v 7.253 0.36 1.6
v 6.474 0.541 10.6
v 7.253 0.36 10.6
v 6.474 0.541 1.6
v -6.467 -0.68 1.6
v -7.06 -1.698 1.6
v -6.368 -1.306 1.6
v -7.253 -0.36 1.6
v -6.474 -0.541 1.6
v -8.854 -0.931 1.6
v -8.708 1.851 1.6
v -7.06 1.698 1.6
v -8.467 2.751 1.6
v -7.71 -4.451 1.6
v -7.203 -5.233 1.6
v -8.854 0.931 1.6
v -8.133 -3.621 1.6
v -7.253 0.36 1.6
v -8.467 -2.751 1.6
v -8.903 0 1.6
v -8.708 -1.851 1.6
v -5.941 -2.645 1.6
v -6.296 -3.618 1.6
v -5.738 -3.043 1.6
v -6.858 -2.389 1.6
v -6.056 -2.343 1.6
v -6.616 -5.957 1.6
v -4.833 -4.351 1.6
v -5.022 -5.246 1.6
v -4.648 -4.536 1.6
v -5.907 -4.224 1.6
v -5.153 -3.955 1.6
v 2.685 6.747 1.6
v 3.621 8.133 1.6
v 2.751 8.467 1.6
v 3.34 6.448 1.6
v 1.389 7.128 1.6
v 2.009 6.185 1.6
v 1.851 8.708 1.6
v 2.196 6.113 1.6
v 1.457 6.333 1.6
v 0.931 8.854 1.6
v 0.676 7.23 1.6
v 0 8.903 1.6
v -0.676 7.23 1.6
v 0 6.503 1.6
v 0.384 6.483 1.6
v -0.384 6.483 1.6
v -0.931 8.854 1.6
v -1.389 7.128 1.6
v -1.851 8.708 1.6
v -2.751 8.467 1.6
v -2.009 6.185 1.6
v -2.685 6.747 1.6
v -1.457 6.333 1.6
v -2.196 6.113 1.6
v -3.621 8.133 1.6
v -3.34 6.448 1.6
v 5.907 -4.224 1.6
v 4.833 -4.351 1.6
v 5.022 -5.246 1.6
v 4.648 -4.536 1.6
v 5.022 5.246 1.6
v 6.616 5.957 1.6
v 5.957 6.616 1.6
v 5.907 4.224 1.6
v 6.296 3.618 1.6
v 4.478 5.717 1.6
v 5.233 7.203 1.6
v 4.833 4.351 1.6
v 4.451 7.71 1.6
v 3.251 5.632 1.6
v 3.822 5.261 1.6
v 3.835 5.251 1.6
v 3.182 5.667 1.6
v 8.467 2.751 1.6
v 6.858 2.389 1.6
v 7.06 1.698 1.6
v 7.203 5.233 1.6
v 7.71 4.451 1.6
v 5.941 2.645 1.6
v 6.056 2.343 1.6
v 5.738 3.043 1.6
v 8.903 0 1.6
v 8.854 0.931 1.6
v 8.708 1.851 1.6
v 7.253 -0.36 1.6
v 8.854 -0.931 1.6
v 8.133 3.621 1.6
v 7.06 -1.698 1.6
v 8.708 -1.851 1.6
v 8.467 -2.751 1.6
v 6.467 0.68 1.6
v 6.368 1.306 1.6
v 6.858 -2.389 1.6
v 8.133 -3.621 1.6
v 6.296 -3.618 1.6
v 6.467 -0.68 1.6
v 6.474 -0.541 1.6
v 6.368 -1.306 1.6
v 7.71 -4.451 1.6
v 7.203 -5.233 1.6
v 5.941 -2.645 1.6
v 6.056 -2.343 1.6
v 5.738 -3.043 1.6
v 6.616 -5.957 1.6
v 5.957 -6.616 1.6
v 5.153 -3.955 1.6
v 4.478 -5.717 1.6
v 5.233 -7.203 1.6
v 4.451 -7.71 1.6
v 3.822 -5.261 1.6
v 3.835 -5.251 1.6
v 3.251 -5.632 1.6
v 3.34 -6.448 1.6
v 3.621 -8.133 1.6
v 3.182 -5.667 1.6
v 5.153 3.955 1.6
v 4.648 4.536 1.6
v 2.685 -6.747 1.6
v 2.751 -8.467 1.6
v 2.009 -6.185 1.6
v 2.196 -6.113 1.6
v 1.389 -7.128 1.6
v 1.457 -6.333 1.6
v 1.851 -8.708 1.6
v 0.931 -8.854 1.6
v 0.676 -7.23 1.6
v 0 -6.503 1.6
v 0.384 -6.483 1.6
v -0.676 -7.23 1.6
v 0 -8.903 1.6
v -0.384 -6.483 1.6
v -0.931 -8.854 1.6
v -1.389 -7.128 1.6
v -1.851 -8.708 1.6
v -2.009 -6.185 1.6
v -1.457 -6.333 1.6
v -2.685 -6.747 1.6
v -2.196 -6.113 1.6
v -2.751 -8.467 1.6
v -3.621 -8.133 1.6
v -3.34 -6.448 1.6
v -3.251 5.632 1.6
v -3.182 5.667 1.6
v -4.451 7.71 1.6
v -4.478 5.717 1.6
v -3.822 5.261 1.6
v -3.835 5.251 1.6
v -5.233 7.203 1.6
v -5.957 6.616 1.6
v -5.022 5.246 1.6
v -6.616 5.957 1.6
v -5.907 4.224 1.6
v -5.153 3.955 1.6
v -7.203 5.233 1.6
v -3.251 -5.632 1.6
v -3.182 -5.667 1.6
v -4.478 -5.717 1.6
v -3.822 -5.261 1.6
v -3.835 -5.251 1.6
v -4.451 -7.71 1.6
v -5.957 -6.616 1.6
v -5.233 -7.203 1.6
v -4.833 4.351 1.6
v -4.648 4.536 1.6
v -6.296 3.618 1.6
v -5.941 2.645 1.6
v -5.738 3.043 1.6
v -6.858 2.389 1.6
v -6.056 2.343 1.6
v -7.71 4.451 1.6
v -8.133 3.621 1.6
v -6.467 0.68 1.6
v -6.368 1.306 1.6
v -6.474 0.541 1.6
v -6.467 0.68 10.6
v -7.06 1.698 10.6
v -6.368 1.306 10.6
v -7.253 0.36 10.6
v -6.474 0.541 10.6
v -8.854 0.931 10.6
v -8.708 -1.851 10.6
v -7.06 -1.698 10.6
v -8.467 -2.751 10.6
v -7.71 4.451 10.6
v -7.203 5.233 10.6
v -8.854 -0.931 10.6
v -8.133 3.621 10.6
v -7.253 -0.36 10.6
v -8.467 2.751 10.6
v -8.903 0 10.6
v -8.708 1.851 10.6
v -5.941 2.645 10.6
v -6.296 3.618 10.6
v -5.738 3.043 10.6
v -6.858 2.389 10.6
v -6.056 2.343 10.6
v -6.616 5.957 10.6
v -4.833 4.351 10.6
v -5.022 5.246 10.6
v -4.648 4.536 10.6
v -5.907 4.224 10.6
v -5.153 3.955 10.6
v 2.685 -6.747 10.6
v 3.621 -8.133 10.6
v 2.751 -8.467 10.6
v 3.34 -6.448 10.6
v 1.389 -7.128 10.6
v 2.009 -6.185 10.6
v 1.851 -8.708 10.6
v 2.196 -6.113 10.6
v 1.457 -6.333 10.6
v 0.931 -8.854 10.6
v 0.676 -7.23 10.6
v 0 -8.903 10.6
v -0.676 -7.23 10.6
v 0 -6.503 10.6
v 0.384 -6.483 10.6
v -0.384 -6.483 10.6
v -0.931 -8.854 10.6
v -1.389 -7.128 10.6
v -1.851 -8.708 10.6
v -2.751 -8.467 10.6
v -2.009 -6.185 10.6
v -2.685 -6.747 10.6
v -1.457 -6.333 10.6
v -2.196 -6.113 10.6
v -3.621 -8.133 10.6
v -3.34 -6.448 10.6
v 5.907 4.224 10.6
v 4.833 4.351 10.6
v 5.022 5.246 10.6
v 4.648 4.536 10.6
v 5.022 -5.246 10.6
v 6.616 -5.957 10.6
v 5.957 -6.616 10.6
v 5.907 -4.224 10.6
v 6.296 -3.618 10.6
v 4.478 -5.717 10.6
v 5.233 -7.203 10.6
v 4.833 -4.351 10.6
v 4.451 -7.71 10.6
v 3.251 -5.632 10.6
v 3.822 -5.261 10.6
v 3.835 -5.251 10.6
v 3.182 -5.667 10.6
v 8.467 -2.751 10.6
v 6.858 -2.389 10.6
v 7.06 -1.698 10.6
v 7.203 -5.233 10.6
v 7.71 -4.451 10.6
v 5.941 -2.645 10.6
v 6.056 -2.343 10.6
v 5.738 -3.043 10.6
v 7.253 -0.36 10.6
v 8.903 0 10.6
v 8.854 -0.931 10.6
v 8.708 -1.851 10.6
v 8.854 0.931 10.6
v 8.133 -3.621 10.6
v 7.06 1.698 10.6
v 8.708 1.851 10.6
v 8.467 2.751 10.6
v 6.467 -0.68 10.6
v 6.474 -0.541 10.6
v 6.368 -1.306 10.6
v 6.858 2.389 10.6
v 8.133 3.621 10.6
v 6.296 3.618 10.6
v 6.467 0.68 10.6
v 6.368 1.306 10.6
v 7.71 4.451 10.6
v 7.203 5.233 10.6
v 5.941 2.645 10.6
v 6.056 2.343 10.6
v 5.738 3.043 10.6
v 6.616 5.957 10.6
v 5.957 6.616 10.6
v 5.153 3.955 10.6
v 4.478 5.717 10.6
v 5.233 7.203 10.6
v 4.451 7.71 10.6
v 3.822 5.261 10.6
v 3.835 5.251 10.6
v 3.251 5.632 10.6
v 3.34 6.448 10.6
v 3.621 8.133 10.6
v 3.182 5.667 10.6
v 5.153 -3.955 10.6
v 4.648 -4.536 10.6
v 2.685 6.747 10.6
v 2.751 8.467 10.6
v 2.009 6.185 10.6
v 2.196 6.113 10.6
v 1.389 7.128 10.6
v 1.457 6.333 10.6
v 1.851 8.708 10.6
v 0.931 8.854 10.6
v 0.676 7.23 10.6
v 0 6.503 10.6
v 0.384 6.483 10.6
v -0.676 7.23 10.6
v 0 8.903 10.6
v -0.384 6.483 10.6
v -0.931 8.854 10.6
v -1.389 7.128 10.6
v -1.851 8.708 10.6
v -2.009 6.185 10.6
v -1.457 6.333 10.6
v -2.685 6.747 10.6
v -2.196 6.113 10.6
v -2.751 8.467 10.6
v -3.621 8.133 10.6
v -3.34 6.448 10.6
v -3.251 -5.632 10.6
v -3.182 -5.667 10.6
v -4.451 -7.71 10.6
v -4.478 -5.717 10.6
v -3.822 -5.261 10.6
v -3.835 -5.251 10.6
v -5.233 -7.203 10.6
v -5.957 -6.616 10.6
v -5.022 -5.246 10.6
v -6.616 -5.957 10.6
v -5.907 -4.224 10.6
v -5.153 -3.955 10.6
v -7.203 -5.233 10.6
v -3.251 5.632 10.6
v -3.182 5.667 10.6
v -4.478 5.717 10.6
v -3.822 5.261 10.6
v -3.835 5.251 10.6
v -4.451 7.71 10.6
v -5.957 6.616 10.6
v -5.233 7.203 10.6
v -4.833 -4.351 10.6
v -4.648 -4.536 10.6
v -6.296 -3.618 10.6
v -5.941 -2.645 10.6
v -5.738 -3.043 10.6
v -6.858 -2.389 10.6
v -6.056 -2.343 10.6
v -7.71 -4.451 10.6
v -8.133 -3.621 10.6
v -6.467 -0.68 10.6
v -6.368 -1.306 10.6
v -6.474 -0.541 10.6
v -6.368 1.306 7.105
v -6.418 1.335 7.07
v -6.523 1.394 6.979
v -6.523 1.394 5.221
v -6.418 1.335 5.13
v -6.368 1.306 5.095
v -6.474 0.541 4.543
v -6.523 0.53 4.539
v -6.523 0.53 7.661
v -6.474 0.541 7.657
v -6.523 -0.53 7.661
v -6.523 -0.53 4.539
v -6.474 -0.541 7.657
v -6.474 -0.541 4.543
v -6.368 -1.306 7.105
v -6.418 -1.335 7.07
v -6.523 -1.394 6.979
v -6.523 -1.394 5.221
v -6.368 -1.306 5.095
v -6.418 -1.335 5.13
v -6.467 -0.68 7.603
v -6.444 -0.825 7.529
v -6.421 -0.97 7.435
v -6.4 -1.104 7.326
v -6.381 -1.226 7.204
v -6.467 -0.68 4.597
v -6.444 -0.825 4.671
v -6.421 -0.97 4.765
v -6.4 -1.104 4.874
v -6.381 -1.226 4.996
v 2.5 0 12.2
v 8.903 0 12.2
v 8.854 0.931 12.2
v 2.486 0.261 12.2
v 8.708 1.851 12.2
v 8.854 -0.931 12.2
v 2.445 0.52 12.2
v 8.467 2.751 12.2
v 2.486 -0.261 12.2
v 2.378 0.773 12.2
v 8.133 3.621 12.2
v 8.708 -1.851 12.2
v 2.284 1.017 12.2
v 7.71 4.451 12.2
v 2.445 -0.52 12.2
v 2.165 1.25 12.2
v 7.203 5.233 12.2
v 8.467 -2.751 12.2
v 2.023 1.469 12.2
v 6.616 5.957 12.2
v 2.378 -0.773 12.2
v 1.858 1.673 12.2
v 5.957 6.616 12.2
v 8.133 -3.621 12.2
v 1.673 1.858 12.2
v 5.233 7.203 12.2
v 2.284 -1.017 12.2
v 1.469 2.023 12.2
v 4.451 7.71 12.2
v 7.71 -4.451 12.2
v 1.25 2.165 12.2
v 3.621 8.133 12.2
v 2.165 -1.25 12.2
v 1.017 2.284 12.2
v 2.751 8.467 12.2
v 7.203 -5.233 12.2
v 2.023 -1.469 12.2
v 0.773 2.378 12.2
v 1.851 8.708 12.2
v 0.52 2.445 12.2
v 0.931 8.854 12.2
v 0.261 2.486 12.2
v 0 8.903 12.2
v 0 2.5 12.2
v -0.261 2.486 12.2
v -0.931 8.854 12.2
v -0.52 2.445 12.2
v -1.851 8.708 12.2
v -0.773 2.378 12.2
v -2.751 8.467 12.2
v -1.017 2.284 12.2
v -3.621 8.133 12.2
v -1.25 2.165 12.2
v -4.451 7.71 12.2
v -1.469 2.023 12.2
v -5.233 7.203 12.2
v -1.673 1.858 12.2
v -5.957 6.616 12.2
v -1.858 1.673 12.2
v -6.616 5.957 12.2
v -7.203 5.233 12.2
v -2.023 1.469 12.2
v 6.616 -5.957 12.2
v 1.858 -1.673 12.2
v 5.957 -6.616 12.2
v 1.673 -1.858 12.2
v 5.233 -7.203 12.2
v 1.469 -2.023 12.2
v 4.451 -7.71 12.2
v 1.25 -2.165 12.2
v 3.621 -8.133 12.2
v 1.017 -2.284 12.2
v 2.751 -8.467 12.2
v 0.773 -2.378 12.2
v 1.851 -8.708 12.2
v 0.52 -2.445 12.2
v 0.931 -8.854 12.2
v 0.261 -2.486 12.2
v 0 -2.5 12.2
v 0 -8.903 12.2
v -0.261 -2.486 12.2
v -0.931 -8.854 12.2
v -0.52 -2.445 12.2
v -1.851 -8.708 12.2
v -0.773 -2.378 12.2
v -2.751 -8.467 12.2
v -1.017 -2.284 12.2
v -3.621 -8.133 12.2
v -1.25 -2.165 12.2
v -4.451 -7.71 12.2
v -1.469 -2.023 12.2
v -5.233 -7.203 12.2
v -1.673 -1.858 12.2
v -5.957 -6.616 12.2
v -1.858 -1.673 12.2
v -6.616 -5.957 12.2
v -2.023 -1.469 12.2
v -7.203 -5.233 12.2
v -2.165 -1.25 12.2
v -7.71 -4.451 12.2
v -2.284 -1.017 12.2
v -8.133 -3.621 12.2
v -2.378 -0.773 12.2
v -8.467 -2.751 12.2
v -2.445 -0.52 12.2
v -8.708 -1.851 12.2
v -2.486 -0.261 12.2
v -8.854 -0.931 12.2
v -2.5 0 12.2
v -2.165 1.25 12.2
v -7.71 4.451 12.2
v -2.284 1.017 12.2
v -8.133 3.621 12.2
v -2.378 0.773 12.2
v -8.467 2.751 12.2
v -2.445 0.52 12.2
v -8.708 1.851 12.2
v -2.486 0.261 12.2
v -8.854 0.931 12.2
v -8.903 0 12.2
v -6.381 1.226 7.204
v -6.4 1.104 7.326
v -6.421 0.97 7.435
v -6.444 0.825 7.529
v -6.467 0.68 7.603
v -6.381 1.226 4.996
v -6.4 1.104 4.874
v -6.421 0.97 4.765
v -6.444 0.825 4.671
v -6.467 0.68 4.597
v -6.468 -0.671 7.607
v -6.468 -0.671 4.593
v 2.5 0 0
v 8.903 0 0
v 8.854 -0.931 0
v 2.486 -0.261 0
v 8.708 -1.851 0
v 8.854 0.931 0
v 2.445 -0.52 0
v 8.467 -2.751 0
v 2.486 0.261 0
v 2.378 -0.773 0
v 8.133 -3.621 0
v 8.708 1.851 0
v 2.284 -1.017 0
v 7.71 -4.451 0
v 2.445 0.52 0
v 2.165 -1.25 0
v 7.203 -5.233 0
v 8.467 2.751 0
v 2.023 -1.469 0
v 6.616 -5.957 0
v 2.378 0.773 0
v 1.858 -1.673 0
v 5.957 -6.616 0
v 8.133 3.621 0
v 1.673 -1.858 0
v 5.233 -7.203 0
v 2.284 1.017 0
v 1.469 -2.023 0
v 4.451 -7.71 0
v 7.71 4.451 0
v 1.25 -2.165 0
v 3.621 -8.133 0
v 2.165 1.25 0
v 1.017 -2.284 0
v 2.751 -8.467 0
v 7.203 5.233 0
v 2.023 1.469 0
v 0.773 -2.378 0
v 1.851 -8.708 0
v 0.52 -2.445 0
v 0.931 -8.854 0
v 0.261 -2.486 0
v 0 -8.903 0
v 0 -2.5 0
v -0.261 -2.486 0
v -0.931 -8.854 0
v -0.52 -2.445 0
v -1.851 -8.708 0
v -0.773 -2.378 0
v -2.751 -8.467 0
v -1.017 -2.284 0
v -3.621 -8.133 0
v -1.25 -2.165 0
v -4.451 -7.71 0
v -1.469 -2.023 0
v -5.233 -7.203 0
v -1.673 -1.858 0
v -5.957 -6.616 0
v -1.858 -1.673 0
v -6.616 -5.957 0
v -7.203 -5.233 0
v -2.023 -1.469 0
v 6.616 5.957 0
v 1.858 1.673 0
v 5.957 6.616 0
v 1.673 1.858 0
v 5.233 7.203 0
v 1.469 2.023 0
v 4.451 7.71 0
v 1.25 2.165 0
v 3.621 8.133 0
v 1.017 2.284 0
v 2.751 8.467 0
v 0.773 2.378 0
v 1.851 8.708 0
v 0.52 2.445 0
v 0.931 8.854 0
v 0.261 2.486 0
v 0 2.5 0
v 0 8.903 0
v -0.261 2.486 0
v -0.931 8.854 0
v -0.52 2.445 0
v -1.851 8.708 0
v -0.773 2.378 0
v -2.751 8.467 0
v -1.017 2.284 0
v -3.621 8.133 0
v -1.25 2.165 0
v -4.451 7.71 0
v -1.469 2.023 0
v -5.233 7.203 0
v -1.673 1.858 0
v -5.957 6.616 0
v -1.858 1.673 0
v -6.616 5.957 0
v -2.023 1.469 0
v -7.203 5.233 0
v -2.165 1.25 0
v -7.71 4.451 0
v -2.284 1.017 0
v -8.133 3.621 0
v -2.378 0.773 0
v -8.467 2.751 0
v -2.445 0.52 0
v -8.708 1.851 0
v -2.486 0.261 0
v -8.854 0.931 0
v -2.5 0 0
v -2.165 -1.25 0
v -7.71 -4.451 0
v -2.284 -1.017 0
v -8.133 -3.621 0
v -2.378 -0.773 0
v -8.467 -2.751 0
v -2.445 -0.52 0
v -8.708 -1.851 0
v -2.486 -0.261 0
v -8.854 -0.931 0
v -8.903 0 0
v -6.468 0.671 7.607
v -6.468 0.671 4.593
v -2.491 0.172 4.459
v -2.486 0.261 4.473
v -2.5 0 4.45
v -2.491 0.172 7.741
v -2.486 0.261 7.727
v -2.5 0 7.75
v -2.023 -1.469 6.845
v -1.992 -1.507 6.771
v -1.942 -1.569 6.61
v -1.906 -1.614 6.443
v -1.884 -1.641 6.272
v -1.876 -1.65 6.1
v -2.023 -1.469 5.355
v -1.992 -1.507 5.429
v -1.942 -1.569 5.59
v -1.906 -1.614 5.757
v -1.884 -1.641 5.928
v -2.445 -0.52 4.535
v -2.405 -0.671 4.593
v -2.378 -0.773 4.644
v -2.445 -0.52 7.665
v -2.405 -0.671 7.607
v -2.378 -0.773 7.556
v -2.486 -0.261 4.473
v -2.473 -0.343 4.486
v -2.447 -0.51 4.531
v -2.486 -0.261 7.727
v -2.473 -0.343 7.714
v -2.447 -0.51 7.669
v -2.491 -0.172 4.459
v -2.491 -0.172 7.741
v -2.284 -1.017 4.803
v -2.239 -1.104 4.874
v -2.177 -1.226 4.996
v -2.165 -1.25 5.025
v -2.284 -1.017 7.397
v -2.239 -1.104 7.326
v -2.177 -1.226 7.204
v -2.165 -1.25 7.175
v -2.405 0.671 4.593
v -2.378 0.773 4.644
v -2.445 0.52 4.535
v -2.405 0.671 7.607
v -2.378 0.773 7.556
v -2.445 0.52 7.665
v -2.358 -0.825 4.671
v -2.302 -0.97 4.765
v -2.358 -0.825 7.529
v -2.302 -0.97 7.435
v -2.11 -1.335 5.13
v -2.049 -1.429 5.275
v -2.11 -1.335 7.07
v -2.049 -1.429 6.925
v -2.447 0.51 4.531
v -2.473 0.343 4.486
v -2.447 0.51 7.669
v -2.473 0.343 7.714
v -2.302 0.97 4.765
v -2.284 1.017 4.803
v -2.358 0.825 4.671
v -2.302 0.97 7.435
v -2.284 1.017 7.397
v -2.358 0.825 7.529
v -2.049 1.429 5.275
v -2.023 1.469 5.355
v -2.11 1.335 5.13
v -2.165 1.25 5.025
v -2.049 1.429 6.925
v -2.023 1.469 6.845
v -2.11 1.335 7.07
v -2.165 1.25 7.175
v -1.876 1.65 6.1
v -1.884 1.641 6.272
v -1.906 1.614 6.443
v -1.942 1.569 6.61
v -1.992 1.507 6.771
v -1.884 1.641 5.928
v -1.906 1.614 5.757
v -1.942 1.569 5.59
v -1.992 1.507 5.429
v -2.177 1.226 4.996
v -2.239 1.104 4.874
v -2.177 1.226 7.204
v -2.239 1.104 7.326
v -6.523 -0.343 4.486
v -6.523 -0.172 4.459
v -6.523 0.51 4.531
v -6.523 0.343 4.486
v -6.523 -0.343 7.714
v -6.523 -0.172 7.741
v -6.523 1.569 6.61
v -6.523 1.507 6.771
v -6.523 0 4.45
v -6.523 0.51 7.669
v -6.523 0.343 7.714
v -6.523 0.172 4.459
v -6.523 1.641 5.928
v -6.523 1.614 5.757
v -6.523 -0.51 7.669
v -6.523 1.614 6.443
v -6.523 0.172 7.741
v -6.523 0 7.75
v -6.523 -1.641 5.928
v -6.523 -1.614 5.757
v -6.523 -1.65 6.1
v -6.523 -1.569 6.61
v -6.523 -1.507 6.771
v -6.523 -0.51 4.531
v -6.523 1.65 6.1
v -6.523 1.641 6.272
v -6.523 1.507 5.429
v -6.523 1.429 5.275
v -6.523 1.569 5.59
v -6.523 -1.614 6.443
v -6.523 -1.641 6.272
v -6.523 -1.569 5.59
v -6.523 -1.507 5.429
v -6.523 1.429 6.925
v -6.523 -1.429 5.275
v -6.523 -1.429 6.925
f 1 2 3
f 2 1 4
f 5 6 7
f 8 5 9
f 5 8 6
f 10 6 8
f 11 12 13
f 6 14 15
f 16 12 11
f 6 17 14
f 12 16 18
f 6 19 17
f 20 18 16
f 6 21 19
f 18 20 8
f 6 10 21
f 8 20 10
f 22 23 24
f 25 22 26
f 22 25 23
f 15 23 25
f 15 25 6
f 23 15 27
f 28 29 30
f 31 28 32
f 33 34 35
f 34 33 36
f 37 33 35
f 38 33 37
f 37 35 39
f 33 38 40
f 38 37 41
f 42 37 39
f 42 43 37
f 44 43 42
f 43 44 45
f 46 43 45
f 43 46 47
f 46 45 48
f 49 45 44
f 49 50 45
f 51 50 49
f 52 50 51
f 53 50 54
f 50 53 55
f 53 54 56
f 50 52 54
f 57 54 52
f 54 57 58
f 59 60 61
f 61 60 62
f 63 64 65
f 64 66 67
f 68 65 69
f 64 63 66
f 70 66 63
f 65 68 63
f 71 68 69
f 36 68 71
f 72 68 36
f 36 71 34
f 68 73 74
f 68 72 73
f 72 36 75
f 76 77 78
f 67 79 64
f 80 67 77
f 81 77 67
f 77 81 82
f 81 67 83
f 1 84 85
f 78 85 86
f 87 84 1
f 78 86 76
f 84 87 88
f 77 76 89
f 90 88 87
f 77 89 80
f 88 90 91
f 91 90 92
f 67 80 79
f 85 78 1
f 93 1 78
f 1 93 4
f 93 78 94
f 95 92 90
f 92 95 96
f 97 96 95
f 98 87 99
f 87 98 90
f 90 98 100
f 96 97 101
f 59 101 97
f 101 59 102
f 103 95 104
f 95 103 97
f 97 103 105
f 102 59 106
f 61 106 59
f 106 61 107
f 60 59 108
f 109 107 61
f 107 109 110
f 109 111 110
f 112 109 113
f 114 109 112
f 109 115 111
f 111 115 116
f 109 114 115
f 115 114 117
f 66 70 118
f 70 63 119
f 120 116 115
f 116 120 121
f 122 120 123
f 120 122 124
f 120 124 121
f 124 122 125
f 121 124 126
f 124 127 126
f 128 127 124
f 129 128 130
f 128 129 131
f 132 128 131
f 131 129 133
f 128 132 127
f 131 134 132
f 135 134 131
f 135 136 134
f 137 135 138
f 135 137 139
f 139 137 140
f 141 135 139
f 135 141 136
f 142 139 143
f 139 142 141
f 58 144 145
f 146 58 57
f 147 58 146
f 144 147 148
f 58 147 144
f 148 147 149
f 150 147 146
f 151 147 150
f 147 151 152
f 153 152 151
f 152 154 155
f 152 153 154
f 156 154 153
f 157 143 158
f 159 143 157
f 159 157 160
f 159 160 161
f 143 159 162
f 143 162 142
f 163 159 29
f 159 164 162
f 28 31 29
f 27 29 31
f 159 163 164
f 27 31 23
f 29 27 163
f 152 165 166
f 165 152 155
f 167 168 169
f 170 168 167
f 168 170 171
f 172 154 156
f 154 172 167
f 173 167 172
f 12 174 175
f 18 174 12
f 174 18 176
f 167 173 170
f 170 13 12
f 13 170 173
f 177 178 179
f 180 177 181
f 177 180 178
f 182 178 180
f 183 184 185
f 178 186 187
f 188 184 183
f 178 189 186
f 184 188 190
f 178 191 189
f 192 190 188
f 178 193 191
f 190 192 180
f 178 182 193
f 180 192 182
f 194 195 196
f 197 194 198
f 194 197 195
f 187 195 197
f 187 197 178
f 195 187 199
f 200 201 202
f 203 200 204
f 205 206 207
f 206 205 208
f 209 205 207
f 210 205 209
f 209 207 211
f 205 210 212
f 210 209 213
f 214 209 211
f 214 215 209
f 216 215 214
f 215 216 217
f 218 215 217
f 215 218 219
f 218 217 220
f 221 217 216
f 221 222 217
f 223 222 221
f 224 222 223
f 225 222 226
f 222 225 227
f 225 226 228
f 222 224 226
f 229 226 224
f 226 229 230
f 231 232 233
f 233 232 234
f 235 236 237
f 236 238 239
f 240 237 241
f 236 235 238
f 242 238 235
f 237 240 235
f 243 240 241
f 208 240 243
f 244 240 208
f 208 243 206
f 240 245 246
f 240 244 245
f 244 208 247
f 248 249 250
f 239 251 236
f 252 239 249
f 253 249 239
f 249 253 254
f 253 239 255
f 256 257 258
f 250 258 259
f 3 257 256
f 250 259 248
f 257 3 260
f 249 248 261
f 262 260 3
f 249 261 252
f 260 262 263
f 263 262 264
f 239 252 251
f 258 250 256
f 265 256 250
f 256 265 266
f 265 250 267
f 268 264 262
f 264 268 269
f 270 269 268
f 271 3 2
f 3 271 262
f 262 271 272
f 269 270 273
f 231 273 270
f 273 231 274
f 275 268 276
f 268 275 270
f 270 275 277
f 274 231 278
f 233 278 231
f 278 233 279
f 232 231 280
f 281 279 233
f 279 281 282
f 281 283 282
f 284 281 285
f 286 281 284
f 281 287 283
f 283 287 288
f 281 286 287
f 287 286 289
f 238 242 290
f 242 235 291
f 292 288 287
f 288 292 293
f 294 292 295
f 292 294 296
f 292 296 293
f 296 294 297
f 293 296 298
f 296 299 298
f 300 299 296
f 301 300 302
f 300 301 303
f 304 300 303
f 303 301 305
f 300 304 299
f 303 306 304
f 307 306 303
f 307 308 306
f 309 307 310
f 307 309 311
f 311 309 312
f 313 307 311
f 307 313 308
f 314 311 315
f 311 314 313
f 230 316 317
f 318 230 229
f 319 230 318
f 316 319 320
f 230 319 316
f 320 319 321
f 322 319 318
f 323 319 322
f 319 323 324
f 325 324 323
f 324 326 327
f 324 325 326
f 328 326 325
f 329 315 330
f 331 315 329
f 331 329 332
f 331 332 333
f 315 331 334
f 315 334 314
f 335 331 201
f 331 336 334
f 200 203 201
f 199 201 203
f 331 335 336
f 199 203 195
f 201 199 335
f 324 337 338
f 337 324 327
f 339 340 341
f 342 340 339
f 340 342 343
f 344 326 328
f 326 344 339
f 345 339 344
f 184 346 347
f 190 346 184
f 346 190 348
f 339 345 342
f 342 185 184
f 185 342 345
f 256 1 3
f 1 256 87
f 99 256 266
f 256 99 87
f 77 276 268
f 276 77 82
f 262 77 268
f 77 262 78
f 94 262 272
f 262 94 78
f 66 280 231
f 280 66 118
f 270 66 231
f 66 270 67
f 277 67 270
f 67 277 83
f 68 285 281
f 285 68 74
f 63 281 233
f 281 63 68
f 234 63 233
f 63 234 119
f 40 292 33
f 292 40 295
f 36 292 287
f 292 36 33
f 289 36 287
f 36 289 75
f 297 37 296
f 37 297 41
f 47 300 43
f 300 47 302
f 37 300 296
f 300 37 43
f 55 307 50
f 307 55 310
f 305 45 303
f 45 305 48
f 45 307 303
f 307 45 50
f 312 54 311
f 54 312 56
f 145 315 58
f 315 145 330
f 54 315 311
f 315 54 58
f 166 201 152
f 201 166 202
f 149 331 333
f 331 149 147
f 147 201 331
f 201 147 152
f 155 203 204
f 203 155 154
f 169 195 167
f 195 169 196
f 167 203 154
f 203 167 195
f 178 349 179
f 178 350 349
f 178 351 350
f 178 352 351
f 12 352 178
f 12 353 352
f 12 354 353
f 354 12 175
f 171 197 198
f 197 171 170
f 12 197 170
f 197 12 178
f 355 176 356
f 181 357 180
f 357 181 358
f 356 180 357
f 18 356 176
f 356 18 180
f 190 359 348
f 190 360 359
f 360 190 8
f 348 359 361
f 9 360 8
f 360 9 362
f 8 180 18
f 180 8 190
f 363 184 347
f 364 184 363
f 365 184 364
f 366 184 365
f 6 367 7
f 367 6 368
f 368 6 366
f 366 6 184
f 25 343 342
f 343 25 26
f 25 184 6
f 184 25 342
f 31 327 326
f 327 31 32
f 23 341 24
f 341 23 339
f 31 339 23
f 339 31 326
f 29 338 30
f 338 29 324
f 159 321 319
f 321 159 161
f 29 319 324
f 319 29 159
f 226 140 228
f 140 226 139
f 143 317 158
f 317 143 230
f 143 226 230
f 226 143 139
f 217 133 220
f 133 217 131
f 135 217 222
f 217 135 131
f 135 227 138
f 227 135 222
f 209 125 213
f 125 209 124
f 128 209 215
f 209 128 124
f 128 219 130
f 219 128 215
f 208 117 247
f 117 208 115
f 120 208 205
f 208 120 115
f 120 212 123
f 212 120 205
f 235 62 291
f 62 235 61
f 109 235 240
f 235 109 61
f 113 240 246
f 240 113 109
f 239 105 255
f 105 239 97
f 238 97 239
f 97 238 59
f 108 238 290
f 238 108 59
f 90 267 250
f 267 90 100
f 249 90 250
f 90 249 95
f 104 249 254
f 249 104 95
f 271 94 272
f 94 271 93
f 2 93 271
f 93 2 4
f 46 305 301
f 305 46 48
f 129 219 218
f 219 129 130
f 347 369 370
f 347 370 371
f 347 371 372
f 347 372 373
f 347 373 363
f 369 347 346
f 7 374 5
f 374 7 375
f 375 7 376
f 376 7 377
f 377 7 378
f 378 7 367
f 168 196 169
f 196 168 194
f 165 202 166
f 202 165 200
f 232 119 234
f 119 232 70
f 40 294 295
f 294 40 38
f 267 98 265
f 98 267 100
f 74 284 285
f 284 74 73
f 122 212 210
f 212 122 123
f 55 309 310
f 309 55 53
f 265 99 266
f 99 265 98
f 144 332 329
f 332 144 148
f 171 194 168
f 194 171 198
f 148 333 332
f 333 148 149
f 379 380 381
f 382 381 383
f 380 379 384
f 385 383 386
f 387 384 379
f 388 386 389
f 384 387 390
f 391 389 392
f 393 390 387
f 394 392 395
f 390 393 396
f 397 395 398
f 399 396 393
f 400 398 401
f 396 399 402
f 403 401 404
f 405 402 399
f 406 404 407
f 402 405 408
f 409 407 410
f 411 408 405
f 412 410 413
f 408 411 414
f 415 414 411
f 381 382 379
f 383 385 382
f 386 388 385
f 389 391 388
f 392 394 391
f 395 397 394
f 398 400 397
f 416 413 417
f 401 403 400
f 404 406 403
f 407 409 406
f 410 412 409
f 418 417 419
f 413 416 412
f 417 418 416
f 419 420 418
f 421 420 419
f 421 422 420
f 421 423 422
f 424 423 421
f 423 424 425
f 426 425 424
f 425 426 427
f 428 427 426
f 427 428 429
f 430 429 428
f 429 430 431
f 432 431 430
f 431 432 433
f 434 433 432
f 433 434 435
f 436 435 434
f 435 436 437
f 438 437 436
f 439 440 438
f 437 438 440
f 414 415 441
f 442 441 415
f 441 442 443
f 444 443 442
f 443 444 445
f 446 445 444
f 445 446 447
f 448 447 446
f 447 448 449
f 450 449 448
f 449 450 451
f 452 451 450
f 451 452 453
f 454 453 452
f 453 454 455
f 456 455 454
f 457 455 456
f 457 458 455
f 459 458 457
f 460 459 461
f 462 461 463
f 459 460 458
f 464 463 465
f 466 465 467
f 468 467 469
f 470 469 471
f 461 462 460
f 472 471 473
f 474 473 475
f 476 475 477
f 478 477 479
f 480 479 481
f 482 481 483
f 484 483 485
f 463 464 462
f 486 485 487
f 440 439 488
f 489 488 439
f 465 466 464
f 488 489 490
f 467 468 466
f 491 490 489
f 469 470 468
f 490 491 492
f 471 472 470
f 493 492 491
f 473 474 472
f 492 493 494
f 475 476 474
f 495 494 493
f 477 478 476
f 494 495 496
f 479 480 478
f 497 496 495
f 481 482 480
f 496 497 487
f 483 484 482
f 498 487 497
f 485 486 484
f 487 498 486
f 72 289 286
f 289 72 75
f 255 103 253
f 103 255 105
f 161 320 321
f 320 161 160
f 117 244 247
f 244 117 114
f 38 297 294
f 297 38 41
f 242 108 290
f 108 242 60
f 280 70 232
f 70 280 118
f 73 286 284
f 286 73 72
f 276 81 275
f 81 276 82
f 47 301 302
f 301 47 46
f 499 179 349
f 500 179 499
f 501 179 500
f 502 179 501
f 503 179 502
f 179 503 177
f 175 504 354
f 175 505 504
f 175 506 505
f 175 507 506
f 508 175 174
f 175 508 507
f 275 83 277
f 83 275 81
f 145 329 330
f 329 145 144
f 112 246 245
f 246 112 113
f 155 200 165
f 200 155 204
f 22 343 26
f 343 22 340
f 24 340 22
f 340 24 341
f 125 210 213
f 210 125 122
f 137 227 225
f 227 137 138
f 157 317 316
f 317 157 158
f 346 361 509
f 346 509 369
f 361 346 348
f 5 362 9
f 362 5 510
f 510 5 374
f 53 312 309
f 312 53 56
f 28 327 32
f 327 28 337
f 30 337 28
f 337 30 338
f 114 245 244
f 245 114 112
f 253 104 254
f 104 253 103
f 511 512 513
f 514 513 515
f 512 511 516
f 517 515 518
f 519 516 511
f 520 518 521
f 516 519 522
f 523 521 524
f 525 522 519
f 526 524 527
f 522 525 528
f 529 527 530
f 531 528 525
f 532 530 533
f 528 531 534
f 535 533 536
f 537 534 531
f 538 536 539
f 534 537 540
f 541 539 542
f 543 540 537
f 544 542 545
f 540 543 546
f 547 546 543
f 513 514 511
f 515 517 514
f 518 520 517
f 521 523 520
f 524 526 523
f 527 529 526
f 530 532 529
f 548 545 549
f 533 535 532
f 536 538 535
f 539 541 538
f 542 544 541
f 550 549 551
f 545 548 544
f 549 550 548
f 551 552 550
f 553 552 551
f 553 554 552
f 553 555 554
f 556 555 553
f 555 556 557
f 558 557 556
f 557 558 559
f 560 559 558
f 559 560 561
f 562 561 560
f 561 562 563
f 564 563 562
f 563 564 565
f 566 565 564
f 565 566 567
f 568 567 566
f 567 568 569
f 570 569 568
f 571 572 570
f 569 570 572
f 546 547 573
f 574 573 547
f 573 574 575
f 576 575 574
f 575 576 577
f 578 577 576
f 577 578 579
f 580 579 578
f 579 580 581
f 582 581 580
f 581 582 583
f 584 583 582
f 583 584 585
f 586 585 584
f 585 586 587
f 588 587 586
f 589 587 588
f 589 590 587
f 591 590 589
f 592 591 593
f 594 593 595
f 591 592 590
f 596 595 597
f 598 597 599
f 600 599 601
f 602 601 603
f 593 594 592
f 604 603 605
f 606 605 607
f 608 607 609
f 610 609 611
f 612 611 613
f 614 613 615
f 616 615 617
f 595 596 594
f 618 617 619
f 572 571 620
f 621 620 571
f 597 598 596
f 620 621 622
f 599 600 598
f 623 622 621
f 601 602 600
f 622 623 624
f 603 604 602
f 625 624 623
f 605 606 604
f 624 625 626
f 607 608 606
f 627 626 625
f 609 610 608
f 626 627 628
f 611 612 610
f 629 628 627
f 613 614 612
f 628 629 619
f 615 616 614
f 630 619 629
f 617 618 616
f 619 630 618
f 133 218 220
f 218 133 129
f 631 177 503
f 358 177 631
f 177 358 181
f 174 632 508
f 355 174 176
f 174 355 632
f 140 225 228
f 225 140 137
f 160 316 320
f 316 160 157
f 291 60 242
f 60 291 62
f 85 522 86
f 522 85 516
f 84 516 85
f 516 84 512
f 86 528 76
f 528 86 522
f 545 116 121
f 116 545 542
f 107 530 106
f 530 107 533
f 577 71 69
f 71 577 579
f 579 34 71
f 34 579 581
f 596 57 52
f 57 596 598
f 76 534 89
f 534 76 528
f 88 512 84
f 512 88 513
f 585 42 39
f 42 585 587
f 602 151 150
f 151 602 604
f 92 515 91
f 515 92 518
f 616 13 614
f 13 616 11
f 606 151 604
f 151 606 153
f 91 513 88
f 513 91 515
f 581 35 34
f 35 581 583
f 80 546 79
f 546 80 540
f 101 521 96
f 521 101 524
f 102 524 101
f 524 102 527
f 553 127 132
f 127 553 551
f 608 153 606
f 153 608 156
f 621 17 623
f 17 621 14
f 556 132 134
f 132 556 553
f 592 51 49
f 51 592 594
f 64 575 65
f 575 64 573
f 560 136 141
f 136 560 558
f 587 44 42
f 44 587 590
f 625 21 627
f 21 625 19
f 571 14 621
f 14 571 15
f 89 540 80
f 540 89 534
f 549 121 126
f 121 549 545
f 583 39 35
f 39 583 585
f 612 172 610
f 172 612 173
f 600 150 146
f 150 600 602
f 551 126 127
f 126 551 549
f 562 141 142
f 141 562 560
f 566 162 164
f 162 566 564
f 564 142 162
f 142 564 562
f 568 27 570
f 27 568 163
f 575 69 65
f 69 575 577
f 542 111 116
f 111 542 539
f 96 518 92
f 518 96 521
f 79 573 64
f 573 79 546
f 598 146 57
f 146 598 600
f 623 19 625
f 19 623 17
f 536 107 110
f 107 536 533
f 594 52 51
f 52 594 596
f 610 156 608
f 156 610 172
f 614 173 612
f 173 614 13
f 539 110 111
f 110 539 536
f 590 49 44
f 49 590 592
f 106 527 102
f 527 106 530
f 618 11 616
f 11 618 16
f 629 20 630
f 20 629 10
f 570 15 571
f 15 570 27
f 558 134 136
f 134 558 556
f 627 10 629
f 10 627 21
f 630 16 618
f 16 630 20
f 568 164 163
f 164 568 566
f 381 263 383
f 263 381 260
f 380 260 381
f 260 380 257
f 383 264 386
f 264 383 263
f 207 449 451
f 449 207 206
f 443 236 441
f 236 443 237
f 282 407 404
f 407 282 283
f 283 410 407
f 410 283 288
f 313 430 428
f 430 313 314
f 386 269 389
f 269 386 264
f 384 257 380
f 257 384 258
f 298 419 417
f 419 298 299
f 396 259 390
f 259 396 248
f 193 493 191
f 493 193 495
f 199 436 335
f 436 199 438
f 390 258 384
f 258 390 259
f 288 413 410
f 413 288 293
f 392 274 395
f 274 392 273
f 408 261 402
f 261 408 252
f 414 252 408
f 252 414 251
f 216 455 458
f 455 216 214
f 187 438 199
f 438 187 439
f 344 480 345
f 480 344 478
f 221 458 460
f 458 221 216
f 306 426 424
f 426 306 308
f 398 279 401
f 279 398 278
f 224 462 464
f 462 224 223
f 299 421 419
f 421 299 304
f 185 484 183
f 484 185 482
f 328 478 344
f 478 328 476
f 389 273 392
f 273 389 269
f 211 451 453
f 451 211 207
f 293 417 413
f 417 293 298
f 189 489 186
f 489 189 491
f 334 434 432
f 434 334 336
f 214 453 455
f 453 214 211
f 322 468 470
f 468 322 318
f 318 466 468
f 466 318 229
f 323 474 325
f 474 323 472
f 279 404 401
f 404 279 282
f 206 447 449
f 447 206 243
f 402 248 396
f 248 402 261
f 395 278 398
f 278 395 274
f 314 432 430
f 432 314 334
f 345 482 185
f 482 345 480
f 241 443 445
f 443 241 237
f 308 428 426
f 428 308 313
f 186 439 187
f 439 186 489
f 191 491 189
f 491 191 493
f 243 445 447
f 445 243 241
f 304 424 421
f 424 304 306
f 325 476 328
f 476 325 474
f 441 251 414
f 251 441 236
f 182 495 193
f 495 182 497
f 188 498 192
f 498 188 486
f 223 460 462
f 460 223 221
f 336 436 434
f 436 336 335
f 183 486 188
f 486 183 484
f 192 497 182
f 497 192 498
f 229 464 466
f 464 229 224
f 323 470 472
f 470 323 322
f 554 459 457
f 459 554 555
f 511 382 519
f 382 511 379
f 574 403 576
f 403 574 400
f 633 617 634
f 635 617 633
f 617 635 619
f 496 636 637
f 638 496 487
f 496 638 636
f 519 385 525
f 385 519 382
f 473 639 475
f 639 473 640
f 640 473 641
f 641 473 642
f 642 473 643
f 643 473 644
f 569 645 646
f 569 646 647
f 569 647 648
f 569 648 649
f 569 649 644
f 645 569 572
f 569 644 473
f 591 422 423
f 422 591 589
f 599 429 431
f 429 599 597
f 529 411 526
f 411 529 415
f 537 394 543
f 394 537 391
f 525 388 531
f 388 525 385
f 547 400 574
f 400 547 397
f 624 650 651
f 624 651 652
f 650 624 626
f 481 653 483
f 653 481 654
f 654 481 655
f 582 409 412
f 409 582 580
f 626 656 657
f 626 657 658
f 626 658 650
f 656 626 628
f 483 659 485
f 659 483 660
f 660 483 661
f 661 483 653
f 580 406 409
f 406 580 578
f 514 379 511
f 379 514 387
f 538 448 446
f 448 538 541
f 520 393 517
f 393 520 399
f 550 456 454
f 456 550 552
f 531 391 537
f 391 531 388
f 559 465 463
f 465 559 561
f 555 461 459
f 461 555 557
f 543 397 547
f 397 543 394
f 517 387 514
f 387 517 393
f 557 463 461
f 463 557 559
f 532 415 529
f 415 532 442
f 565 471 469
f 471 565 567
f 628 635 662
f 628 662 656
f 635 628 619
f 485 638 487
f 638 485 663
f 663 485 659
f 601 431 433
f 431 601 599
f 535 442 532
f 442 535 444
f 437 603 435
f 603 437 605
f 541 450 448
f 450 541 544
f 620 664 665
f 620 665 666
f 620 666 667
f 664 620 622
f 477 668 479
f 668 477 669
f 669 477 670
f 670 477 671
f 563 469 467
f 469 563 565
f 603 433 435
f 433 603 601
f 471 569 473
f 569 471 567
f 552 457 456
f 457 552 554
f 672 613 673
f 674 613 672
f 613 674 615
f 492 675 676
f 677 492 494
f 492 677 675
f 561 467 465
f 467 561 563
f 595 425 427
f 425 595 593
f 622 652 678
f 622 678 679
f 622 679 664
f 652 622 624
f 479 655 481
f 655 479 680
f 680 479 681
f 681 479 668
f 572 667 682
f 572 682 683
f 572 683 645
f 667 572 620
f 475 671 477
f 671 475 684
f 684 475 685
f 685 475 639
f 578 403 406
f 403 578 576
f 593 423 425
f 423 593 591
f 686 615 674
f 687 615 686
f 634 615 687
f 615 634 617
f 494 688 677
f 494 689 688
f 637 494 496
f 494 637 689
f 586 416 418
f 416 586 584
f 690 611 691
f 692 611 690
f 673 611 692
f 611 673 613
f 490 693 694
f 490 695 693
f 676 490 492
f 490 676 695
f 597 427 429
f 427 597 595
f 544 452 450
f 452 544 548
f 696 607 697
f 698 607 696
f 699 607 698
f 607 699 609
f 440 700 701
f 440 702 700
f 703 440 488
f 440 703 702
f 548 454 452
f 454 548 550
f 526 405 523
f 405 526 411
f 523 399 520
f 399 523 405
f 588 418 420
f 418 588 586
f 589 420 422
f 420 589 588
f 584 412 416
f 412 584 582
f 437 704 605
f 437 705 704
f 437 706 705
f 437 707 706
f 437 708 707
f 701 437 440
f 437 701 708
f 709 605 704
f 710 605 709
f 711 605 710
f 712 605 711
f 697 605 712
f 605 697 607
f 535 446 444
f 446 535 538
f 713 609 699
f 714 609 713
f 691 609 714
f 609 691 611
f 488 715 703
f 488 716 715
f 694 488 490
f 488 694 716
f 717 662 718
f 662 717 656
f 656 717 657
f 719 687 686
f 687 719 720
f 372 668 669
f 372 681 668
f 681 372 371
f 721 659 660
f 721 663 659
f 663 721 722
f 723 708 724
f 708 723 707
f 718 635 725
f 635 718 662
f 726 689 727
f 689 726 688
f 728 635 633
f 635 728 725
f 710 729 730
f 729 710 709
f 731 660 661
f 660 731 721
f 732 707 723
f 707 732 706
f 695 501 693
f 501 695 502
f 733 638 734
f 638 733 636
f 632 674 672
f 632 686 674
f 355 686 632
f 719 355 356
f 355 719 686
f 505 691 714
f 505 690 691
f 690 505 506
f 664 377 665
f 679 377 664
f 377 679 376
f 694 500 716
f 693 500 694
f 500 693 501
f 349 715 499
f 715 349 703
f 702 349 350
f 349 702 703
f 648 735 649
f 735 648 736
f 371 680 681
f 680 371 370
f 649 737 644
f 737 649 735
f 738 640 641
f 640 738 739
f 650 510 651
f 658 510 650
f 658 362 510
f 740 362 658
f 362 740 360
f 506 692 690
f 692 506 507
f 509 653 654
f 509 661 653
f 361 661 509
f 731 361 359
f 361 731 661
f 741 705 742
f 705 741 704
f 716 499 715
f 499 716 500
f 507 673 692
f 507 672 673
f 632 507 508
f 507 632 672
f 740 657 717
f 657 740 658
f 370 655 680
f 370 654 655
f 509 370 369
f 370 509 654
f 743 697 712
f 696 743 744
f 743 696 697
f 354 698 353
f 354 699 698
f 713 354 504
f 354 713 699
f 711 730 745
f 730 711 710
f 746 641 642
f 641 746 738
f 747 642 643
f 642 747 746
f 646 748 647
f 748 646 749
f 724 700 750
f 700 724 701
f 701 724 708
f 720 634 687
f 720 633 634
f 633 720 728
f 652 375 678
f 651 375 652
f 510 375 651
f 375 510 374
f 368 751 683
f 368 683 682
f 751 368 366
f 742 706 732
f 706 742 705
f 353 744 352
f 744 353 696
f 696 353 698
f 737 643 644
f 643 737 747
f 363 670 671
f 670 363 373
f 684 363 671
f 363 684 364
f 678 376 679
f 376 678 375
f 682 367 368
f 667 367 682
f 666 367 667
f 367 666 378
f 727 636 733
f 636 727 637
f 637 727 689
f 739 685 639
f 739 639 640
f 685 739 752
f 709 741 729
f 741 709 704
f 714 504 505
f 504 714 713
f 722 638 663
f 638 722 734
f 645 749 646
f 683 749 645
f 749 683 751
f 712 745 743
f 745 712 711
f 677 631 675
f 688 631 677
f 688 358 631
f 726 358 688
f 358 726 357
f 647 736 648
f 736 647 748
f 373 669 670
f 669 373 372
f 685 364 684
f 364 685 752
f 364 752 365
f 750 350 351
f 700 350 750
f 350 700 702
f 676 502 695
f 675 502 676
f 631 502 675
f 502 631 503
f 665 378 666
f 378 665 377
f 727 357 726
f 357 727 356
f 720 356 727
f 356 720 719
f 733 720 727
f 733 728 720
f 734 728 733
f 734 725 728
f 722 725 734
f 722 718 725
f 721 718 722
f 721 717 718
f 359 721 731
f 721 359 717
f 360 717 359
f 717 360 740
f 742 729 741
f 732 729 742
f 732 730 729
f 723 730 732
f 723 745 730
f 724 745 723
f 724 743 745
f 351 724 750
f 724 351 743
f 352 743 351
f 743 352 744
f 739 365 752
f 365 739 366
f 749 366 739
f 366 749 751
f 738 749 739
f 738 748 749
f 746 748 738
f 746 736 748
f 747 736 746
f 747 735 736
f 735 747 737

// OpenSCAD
// GT2 pulley, 22 teeth for 9 mm belt.
$fn = 60;
eps = 0.02;
teeth = 22;
belt_pitch = 2;
belt_w = 9;
shaft_d = 5;
set_screw_d = 3.3;
tooth_depth = 0.75;
tooth_overlap = 0.28;
tooth_base_w = 1.2;
tooth_tip_w = 0.72;
flange_t = 1.6;
core_d = teeth * belt_pitch / PI - 1.0;
body_h = belt_w + 2 * flange_t;
module tooth() {
    linear_extrude(height = belt_w)
        polygon(points = [[-tooth_overlap, -tooth_base_w / 2], [tooth_depth, -tooth_tip_w / 2], [tooth_depth, tooth_tip_w / 2], [-tooth_overlap, tooth_base_w / 2]]);
}
difference() {
    union() {
        cylinder(d = core_d, h = body_h);
        cylinder(d = core_d + 4.8, h = flange_t);
        translate([0, 0, body_h - flange_t]) cylinder(d = core_d + 4.8, h = flange_t);
        for (i = [0 : teeth - 1]) rotate([0, 0, i * 360 / teeth]) translate([core_d / 2, 0, flange_t]) tooth();
    }
    translate([0, 0, -eps]) cylinder(d = shaft_d, h = body_h + 2 * eps);
    translate([-core_d / 2 - eps, 0, body_h / 2]) rotate([0, 90, 0]) cylinder(d = set_screw_d, h = core_d / 2 + 2 * eps);
}
